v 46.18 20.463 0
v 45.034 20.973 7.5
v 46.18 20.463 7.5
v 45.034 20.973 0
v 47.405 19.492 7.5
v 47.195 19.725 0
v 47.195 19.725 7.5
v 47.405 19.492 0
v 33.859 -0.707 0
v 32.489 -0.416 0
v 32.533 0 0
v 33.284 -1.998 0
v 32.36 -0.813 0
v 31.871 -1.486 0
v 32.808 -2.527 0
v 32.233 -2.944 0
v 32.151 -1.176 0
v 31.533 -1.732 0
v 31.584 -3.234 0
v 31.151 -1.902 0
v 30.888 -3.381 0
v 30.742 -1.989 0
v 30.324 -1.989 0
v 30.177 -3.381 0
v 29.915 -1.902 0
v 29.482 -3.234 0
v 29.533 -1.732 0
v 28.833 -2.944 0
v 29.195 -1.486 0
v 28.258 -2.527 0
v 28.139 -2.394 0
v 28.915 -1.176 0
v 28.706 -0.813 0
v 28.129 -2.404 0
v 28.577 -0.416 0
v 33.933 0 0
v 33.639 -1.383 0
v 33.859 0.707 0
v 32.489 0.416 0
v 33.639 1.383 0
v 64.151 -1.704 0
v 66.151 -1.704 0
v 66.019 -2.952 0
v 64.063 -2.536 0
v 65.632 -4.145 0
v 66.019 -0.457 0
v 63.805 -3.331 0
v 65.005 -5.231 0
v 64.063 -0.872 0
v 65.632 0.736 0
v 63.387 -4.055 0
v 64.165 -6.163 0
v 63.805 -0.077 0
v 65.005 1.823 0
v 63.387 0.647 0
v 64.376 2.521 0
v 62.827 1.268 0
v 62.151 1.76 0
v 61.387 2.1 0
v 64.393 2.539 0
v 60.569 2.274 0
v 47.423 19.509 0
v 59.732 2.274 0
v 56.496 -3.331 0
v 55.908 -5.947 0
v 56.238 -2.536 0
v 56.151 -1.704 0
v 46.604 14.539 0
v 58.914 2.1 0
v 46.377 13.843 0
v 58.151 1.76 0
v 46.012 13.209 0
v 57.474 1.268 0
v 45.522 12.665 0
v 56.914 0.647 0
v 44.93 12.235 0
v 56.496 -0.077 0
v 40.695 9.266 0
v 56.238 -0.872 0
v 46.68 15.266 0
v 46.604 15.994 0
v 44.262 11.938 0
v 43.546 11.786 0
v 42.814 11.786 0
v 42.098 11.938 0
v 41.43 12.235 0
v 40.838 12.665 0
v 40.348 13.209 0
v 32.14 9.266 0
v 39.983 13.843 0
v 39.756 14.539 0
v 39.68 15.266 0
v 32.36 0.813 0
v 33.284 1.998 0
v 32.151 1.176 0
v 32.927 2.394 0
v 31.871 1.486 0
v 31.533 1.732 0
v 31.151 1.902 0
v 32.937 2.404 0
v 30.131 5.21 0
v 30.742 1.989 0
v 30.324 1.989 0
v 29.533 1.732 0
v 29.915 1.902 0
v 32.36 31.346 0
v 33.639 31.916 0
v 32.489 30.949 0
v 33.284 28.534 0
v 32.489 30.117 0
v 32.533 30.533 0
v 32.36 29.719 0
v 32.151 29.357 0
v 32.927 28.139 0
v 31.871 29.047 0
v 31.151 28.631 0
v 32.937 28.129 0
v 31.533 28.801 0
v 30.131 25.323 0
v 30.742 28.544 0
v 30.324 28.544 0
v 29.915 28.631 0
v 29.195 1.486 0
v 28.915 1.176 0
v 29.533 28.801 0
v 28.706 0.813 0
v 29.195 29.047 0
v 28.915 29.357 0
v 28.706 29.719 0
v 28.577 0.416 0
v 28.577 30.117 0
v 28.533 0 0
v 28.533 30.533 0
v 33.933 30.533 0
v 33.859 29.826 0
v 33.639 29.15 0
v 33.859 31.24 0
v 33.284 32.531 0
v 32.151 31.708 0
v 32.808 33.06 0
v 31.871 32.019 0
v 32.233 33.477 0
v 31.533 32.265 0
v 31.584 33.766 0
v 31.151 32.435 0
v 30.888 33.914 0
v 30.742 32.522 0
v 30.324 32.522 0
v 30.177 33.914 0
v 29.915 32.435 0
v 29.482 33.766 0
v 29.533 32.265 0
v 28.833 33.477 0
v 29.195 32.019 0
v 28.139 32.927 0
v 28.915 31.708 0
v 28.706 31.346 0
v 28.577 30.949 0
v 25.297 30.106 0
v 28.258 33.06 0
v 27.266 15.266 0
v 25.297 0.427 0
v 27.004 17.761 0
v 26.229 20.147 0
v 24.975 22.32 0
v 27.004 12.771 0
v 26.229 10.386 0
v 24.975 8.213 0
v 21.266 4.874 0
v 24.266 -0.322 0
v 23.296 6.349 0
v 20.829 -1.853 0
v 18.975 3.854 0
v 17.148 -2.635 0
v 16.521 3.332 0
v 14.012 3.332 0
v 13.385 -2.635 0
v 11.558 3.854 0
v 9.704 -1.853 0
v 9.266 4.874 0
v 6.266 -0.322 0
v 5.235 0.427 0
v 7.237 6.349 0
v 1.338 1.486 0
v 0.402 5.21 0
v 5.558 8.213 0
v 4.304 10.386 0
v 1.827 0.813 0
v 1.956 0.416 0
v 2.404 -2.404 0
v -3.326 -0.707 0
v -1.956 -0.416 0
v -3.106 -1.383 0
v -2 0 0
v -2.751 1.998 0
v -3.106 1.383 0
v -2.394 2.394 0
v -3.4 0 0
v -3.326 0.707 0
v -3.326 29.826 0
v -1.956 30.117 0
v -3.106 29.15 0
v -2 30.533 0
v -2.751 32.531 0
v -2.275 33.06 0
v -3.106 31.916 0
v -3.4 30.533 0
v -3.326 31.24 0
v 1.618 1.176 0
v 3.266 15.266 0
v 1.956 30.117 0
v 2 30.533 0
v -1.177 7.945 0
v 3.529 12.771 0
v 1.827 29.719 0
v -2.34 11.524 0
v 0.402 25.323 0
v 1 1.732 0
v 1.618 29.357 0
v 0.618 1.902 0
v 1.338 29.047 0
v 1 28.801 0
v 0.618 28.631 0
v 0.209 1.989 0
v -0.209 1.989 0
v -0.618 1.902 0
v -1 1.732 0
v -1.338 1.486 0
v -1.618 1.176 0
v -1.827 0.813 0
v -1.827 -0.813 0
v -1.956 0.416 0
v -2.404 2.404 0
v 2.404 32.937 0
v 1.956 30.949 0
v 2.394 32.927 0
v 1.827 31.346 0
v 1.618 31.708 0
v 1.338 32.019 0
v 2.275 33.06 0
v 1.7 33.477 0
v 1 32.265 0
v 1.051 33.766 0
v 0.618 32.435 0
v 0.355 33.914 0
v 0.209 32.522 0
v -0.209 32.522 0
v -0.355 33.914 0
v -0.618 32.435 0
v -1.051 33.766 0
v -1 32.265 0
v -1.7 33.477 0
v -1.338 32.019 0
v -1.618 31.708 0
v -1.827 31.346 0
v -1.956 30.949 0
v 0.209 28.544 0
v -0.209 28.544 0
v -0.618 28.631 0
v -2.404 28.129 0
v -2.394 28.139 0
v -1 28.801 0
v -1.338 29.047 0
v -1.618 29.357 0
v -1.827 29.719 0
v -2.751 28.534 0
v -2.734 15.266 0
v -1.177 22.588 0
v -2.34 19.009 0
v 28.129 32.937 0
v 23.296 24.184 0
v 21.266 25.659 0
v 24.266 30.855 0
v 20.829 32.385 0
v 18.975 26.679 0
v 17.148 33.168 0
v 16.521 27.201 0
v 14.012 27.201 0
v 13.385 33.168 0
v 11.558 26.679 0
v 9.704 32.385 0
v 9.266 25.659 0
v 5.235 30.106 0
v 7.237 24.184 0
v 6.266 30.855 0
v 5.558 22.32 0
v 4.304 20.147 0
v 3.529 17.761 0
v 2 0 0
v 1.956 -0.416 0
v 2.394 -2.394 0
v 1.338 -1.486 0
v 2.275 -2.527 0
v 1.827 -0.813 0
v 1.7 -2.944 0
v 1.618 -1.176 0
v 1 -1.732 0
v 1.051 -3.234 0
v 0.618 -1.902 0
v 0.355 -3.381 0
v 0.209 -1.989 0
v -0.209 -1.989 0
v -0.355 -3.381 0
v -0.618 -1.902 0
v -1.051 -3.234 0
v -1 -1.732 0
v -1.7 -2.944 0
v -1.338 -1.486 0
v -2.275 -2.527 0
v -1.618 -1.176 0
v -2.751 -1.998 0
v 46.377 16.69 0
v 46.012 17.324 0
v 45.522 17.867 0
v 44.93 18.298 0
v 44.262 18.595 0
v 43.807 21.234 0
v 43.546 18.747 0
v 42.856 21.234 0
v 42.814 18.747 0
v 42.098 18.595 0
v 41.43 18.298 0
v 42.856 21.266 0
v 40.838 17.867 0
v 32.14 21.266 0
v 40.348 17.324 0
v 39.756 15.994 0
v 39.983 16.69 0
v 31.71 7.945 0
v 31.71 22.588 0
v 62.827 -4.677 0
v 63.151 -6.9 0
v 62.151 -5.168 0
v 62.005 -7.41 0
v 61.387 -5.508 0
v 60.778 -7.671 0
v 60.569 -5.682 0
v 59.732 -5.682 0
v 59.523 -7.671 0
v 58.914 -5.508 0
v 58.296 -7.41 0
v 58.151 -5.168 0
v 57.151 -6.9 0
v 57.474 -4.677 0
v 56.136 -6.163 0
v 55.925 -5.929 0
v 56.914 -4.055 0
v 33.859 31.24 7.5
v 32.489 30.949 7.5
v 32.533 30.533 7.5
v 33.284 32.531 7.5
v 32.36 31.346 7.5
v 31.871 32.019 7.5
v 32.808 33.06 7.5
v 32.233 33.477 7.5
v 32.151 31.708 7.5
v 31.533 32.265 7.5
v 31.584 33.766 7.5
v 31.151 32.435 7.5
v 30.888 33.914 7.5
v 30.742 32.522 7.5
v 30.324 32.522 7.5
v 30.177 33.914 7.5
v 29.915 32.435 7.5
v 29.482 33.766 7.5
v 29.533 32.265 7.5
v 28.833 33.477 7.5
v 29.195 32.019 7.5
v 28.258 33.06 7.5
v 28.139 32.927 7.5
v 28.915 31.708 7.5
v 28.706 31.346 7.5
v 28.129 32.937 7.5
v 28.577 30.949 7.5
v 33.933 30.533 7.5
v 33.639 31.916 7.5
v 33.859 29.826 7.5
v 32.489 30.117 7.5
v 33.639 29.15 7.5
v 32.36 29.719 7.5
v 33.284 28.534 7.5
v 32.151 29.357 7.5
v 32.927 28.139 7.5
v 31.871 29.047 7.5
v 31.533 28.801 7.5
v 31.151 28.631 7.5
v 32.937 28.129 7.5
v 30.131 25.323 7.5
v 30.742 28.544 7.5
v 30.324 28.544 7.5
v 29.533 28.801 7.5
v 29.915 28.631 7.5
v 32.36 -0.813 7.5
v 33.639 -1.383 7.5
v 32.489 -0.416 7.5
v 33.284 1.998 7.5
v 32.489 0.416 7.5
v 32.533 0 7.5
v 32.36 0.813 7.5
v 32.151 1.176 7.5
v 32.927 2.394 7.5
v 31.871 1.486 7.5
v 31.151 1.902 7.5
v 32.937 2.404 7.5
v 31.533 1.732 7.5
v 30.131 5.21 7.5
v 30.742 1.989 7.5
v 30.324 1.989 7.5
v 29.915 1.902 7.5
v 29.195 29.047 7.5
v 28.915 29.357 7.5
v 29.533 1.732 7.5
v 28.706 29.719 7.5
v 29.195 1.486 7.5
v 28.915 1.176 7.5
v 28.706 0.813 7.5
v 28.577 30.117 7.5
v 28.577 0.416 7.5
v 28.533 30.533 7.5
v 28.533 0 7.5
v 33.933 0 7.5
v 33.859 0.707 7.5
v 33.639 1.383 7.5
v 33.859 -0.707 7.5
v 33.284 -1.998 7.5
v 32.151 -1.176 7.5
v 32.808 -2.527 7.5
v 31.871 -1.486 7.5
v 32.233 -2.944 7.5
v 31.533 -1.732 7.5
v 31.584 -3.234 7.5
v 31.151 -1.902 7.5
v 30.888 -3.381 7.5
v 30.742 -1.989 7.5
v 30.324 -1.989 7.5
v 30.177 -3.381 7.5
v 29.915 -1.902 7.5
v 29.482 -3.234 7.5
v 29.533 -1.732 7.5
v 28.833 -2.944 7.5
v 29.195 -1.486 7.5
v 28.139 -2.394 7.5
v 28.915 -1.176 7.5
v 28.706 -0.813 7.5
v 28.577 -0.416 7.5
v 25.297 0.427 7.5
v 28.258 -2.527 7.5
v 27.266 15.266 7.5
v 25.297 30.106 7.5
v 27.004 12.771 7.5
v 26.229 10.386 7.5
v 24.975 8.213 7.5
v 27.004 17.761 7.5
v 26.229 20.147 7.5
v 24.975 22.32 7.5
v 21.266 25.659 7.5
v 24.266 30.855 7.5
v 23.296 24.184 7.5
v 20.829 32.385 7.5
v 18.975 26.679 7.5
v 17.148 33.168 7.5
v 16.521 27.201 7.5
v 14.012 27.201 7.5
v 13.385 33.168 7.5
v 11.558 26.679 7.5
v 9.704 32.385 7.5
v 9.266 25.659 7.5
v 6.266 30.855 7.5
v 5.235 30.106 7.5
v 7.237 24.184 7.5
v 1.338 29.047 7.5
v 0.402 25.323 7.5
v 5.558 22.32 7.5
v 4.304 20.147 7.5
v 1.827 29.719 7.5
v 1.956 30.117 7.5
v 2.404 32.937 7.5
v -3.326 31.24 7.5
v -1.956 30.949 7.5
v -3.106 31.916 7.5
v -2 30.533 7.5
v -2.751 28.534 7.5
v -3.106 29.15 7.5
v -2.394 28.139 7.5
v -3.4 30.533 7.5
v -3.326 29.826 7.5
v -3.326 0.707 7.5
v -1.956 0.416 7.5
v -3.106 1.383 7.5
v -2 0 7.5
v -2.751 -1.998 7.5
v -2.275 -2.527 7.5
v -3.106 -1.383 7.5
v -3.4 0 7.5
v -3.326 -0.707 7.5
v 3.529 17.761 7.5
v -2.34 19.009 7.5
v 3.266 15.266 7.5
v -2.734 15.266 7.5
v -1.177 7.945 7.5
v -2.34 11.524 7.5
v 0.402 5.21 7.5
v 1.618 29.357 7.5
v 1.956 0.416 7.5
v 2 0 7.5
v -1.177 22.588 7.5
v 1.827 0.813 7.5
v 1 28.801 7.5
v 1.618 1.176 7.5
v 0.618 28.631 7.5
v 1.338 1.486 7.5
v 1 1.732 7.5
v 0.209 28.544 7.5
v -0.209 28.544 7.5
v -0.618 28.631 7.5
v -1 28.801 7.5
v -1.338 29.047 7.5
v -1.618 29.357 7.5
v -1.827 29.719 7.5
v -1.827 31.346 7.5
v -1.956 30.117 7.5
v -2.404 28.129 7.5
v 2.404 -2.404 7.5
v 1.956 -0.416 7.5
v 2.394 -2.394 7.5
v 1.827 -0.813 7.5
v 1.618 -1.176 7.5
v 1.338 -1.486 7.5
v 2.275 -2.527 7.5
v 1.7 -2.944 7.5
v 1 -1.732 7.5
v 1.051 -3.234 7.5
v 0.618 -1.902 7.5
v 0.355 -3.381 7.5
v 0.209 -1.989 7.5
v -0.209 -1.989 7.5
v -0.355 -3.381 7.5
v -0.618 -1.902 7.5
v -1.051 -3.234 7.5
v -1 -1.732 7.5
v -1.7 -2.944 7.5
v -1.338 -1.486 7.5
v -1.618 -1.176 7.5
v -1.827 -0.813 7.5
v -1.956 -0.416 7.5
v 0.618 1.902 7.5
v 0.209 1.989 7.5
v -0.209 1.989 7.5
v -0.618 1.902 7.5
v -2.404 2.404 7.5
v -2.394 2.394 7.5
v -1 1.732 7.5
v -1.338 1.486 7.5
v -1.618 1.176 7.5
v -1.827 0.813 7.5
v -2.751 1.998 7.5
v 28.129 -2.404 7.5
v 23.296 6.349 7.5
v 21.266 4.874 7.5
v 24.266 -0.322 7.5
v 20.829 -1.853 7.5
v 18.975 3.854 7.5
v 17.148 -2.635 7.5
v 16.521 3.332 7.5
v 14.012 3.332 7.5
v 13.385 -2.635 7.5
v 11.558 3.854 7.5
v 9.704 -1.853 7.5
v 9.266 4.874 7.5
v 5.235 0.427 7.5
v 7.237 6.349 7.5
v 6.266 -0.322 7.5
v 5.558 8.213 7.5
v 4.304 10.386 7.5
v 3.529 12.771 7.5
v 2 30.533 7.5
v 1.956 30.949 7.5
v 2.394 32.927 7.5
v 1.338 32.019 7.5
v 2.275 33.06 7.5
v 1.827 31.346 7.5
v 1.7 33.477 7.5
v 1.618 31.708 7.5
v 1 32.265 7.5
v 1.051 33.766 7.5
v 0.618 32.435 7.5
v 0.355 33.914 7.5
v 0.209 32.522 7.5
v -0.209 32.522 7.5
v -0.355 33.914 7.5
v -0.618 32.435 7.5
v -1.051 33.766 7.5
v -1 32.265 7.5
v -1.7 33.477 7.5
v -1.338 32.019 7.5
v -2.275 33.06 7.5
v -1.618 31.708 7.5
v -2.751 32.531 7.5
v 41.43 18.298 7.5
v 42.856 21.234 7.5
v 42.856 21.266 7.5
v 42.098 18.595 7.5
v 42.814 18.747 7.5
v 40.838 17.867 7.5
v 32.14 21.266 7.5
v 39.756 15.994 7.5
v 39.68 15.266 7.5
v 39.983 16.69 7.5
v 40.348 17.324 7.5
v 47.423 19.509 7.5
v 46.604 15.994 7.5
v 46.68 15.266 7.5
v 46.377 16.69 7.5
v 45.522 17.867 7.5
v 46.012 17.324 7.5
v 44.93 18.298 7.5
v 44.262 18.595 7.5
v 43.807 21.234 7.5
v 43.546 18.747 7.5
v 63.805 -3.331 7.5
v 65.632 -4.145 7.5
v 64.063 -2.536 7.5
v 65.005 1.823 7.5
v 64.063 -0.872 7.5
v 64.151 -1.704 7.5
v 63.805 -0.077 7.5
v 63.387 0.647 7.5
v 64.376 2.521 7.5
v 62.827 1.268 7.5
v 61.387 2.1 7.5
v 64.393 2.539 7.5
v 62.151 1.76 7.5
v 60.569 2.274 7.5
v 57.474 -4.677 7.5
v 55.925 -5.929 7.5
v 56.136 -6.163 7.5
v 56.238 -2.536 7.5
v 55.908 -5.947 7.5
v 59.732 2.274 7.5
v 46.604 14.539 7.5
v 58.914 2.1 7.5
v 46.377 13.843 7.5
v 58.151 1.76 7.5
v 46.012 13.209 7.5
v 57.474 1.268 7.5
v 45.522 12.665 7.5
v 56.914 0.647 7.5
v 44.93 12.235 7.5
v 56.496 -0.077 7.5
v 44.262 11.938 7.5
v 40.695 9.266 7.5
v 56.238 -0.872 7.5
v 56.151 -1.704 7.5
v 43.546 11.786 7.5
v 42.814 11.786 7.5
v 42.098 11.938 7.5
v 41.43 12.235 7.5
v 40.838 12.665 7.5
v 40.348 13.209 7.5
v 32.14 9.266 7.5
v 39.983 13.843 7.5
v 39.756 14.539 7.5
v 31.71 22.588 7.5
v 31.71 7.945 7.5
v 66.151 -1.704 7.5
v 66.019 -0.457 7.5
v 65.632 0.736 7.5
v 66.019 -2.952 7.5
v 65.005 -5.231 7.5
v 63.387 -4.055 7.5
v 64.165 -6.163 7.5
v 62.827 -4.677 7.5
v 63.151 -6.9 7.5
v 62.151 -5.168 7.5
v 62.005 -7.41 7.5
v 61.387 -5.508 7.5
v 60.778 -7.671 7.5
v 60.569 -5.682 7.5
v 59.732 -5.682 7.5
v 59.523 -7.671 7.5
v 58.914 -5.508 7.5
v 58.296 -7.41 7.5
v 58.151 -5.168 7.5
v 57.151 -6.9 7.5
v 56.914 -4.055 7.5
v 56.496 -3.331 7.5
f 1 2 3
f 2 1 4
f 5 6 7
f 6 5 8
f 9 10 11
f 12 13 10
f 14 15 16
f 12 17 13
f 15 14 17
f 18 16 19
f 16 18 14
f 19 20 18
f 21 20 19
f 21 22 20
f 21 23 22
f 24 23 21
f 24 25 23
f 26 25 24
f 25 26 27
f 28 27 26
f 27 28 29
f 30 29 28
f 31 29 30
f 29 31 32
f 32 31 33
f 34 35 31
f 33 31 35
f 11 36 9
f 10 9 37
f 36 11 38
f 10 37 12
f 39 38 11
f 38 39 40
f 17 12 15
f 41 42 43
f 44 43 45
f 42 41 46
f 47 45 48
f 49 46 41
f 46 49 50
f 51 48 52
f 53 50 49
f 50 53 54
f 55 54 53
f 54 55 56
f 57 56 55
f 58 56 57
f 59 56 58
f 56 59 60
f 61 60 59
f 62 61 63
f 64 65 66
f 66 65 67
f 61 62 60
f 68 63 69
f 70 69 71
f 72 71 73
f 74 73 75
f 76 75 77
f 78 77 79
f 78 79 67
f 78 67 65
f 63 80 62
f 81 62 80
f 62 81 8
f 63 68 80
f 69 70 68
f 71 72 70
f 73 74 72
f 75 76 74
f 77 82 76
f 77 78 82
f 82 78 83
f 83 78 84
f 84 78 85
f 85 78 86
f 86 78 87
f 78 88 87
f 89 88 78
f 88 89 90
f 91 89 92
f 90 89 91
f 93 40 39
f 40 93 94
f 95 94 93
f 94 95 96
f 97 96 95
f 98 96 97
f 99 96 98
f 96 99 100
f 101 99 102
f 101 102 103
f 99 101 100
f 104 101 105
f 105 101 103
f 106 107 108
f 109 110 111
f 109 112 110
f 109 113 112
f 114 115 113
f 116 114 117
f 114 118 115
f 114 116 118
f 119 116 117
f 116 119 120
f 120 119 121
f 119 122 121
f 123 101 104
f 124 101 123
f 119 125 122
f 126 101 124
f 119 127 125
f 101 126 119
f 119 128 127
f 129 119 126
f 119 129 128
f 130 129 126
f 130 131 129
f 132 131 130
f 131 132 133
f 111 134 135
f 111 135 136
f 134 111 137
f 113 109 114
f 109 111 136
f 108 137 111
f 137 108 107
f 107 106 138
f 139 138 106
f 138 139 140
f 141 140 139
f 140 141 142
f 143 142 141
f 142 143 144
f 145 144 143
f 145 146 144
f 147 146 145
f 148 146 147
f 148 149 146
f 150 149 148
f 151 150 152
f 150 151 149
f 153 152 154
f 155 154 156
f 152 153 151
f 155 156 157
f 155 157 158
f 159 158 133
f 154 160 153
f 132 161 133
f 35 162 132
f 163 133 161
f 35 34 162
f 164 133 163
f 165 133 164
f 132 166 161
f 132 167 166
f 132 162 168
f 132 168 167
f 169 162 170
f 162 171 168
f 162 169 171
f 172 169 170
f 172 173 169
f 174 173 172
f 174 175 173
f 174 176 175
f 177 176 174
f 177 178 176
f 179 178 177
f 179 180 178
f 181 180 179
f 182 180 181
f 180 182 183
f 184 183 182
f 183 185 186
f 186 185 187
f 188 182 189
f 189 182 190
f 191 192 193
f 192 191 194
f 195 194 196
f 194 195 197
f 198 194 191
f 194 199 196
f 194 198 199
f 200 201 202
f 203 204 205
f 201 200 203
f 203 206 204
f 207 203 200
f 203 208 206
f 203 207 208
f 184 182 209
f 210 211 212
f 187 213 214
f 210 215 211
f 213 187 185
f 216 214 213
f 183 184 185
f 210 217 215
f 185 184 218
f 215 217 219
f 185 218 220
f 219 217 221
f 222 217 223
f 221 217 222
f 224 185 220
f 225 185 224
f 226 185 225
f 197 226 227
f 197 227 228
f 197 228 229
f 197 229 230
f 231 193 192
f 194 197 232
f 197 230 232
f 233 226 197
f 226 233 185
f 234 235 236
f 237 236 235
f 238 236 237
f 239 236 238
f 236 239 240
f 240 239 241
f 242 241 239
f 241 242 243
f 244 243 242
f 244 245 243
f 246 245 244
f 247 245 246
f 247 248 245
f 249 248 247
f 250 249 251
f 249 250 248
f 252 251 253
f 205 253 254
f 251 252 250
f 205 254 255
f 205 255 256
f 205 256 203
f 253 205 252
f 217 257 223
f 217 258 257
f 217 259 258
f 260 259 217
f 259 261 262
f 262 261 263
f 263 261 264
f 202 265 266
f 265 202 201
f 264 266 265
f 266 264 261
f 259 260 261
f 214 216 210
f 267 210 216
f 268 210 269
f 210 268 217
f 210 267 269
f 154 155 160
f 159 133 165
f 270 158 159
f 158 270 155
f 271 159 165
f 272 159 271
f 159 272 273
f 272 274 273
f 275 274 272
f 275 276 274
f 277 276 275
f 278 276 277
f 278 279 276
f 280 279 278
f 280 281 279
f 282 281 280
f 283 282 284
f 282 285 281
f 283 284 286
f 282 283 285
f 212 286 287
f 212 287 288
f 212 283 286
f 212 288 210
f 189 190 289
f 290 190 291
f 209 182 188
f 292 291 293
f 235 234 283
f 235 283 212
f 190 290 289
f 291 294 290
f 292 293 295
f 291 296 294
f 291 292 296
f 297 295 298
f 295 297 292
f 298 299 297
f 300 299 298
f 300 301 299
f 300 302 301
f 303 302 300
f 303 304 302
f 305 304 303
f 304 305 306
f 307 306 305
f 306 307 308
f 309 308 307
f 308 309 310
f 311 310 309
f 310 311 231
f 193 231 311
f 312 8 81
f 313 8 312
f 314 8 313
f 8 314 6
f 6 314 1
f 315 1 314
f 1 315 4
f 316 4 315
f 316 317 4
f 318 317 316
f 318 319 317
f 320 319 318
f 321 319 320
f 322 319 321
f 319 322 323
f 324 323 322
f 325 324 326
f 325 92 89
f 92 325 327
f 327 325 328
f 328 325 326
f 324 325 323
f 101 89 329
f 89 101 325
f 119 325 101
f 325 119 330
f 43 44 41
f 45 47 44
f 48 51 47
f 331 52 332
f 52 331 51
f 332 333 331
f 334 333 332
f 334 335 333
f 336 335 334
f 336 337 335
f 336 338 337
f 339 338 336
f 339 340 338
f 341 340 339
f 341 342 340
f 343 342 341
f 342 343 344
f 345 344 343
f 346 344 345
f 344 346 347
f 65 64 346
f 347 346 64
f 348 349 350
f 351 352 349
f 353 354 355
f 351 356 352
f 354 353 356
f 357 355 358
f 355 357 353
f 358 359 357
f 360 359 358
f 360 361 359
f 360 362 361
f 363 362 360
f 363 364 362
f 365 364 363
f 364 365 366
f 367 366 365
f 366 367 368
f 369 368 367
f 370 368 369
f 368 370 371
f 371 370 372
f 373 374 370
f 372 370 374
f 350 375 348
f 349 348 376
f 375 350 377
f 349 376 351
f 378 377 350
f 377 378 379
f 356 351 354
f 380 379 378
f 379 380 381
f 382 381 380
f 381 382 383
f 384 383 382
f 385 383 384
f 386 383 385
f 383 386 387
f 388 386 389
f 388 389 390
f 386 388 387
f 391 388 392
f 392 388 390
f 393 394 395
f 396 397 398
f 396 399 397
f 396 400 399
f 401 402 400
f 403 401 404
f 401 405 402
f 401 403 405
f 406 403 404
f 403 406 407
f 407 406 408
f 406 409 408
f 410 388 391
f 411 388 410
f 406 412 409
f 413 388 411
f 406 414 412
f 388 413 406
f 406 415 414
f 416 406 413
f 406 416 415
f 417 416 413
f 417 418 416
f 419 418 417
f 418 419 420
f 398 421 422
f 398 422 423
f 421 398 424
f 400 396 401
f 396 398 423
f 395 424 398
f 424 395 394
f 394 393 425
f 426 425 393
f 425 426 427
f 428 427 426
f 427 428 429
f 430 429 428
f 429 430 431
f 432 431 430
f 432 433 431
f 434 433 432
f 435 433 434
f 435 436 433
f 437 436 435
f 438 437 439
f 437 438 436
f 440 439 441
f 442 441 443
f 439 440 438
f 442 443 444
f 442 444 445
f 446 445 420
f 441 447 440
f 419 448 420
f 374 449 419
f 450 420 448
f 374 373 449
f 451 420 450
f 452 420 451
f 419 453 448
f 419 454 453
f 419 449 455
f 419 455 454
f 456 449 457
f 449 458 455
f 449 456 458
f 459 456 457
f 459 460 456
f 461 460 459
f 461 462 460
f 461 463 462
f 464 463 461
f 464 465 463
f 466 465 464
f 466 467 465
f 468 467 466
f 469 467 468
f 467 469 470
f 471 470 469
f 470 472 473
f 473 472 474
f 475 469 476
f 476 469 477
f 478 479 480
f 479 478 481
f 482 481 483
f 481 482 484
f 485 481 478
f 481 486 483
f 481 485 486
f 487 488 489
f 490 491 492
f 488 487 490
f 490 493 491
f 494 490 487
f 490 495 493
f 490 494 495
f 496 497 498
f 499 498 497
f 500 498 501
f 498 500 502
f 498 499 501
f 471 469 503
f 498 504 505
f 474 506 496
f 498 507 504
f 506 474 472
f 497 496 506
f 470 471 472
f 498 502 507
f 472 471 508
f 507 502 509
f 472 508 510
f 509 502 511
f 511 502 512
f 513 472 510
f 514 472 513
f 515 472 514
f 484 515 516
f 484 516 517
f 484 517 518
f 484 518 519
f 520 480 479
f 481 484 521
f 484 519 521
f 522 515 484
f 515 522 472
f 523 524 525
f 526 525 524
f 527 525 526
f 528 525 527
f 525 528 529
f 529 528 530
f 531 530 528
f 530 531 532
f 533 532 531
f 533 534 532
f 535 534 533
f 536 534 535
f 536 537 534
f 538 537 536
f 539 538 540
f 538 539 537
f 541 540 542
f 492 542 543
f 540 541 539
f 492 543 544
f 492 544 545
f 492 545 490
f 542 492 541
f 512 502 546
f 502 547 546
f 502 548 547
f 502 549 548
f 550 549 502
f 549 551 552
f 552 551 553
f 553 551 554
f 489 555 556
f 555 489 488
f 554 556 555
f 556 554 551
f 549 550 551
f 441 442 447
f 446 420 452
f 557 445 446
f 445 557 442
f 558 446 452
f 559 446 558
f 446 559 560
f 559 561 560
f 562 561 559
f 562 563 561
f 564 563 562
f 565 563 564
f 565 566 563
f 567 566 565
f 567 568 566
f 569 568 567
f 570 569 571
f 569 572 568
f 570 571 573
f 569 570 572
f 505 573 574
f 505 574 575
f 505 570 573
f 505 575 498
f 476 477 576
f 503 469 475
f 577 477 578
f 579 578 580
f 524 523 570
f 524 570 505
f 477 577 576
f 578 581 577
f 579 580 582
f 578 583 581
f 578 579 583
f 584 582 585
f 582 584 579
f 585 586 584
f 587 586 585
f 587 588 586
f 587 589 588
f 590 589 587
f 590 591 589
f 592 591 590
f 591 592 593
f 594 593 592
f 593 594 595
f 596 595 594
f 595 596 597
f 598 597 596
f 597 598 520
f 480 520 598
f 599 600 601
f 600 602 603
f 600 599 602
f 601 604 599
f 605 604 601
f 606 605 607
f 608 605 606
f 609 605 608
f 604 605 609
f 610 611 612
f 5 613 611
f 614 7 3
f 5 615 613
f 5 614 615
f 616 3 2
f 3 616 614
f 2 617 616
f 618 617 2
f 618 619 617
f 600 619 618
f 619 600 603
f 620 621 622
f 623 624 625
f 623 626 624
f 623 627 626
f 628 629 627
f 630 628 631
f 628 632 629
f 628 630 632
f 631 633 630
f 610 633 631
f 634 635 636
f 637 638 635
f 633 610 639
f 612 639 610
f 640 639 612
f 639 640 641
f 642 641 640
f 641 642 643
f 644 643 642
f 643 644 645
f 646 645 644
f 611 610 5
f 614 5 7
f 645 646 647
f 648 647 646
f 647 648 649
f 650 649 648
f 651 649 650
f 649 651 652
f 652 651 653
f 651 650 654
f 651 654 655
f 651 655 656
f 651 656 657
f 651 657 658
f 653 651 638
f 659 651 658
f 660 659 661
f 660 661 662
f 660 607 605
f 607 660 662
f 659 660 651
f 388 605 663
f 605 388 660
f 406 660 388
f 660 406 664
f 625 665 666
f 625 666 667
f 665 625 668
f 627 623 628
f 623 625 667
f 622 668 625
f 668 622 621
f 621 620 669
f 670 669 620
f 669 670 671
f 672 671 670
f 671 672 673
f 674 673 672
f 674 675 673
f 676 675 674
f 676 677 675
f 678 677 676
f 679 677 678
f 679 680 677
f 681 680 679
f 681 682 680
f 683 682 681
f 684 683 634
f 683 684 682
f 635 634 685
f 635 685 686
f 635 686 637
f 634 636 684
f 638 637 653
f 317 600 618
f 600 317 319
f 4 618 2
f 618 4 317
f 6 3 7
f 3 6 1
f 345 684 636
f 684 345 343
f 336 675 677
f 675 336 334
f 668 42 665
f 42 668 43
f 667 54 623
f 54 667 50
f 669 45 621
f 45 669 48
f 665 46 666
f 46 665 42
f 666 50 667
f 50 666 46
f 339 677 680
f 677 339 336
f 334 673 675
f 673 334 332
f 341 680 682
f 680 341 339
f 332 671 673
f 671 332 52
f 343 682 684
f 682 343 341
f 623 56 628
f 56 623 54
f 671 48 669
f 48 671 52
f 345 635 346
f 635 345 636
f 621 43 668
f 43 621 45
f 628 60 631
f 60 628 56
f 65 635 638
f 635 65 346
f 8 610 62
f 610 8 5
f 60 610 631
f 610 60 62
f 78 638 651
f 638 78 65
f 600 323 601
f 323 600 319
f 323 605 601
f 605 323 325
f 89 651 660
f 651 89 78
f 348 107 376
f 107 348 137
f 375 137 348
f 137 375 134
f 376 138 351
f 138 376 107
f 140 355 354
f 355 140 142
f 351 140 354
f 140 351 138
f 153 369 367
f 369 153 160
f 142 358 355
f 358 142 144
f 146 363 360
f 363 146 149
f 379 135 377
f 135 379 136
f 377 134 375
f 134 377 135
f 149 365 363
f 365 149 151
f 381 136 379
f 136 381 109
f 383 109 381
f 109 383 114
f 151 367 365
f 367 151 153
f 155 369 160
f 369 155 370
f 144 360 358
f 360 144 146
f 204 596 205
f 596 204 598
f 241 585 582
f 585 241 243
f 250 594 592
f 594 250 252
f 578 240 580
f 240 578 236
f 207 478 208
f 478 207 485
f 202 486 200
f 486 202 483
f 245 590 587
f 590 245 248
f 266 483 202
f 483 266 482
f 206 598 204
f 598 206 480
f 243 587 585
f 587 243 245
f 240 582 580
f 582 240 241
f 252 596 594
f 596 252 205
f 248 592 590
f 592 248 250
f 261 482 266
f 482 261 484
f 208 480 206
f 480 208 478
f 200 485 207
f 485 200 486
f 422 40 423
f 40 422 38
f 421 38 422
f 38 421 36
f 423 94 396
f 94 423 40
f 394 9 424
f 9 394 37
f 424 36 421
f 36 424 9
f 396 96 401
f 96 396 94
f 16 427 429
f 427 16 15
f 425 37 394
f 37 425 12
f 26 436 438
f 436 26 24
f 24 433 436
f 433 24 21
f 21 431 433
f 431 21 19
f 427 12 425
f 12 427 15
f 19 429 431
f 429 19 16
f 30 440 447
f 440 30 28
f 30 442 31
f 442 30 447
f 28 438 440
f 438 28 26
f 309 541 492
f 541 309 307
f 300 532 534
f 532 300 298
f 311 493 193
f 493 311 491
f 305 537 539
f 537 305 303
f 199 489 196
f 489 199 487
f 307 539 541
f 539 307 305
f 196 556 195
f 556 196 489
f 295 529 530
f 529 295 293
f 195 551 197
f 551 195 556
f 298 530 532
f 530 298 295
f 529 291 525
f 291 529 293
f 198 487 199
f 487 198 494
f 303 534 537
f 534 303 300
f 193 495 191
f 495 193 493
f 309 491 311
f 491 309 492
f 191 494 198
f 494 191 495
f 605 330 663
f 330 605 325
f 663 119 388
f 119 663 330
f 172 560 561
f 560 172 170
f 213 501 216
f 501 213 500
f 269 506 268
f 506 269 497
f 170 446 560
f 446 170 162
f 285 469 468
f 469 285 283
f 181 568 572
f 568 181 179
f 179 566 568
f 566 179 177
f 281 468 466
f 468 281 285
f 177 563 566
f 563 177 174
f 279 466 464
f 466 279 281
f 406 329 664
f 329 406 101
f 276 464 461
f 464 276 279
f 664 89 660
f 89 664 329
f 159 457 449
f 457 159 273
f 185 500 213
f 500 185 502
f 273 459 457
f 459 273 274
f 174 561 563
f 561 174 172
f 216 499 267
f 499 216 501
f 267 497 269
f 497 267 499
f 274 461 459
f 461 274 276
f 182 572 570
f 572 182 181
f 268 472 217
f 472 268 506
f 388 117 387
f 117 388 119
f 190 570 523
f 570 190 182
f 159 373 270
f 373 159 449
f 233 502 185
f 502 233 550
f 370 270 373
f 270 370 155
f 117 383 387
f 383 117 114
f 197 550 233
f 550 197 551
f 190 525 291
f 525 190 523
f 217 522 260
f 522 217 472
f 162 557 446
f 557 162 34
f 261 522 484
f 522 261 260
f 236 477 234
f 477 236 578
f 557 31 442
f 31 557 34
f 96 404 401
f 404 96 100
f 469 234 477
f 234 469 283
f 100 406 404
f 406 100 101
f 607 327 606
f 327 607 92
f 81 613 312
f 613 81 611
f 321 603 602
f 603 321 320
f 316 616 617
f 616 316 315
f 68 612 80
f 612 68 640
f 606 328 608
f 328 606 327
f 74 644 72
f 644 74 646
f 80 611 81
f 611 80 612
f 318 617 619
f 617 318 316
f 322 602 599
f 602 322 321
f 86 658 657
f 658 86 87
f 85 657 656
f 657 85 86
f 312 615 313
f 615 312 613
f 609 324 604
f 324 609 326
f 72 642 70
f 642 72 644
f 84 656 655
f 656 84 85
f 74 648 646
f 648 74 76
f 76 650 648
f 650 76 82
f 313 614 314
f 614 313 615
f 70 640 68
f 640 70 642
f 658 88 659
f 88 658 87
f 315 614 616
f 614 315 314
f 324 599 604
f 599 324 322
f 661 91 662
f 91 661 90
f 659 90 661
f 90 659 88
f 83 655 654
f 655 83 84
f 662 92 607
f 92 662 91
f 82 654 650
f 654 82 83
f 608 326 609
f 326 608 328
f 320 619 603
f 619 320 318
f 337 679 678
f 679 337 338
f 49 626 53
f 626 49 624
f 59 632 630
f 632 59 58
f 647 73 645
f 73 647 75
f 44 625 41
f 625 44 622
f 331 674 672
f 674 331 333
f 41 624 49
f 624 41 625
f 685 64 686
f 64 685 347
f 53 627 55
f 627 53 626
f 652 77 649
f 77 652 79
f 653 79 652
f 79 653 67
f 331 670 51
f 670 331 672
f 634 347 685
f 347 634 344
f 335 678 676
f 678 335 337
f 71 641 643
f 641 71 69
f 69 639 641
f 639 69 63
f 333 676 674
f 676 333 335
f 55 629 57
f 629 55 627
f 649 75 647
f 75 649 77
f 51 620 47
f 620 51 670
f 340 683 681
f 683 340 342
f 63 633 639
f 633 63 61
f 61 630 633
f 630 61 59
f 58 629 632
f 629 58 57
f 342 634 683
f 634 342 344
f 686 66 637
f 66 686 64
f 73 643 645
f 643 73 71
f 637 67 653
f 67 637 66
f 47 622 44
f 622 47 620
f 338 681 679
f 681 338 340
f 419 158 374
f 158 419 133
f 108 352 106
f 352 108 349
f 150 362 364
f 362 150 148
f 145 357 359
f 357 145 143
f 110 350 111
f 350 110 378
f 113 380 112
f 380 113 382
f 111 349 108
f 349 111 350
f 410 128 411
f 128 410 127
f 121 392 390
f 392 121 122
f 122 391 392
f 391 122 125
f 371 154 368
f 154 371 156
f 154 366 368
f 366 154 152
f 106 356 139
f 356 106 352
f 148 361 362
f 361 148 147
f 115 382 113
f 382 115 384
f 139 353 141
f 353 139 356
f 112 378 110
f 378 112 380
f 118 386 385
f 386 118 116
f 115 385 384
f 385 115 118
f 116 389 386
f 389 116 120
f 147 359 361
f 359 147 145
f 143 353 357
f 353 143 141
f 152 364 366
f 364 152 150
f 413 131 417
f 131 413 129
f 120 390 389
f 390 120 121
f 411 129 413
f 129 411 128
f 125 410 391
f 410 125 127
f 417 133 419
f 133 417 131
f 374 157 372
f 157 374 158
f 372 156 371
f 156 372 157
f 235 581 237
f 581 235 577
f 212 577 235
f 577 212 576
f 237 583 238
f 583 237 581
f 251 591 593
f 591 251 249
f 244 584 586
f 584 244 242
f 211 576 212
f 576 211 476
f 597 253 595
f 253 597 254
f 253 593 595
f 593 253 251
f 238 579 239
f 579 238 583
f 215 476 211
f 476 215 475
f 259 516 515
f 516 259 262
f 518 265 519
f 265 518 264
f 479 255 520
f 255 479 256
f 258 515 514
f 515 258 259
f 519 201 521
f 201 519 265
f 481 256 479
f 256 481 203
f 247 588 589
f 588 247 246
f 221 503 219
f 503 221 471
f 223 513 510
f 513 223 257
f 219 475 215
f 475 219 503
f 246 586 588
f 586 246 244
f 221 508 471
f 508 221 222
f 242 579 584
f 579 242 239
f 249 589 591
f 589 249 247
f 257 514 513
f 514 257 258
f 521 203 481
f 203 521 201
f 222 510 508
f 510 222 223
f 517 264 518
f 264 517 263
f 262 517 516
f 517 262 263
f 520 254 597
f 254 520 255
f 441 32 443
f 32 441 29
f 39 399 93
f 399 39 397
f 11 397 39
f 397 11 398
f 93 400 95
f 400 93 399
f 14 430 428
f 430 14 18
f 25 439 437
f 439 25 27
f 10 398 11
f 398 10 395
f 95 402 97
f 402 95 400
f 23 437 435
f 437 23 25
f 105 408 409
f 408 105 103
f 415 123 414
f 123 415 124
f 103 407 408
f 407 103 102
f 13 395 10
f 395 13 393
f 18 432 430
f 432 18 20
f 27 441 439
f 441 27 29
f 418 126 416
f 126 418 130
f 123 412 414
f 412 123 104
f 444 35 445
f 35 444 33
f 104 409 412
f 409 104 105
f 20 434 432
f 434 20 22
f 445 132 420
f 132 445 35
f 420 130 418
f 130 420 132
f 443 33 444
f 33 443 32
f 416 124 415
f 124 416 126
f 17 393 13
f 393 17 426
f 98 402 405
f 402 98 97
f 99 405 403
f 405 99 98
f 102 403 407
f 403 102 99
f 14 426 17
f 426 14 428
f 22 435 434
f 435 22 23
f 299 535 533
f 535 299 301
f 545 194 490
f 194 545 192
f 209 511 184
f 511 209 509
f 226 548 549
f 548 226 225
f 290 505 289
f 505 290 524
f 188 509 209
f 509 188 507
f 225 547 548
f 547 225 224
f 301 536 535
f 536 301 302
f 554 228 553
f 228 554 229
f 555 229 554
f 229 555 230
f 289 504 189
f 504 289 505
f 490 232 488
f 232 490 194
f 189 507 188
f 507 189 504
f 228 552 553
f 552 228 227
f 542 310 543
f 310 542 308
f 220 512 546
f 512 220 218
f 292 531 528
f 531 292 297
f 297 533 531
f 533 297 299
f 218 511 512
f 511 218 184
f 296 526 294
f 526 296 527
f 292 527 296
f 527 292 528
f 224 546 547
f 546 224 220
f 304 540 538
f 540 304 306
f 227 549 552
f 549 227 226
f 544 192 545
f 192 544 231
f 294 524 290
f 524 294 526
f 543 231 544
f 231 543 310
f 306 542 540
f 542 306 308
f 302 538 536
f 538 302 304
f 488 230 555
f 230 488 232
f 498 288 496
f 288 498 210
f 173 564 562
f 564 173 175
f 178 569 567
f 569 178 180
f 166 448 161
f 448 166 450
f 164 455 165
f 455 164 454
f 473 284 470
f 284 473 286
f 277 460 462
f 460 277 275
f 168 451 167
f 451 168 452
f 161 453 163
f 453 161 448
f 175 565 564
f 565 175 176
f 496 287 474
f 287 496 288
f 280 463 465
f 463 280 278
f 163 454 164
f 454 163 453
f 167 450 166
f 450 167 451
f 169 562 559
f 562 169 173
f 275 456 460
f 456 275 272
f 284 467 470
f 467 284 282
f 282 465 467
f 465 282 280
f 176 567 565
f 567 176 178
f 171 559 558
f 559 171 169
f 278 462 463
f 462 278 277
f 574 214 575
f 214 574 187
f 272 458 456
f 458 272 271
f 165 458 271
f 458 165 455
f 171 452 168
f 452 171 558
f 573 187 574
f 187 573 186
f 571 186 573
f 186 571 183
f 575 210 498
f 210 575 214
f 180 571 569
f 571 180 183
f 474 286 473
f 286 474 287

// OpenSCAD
// file: config.scad
//This REALLY REALLY needs to get organized. I will start sorting through it ASAP 

//Vars for the fram vertex. This is still kind of confusing. File is broke sometimes. I would watch this in preview before trusting these values.
framerodsize = 8.5;
framerodtap =7; // we use this one in the y motor for the top rod that gets tapped as well
vertexwall = 3;
vertexthick = framerodsize*2 + vertexwall*2; // I would say leave this alone. 
triangle= 60;
mirror=false;

// vars for the y motor mount
vertexhole = 8; //the diameter of the vertex hole in whosawhatasis vertex. Really important these values match.
partthick =9;
wallmulti = 2; //the wall thickness multiplier
motorwallmulti = 2.3; //multiplier for the motor holes because you might want them thicker
centerwallmulti = 1.5; //multiplier for the center hole because you might want them thinner
nemasize = 1.7;
motorscrew = 4; //diameter of the motor attachment screw
motorcenter = 24; //center hole size for the motor

//Top piece vars
nemasize= 1.7;
motorwallmulti= 1.9;
motorscrew = 4;
motorcenter= 23;
centerwallmulti = 1.7;
motorbody = 43;

partthick = 8;
toprodbefore =7;
toproddia = 8.5;
toprodwall = 4;
toprodspacing = 72;
siderodtap = 7;
sideroddia = 8;
siderodwall = 4;
angle = 60;

zsmoothdia =8;

xrodspacing = 55; //rod spacing center to center
xroddia = 8; //rod diamter
nemasize = 1.7;
znutdia = 14.8;
znuth = 7; //znut height
zroddia = 8;
nutwall = 3; //wall thickness
zbeforetapdia = 7.5; 
bushingod = 16;
bushingtower =xroddia+nutwall*sin(45)+xrodspacing ;
towergap= 10;
wallmulti = 1.5;
motorwallmulti = 1.7;
motorscrew =4;
partthick = 7.5; //thickness of the motor mount
centerwallmulti = 1.5; // center motor hole multi
motorcenter = 24;
supportwidth = 17;
$fn = 30;

//xcarriage 
carriagewidth = 60;
bushingwall = 3;
backwall = 5;
tools = 2;
tool1dia = 16;
tool2dia = 16;
adapterholedia = 4;
platformthick = 10;
platformextension = 40; 
pulleydia = 12;
beltthick = 2;
clampthick = 4;
clampholedia = 4;

//pen holder 
penwall = 3 ;
holdingscrewdia = 3;
shaftheight = 30;
// main file
//vertexhole = 8; //the diameter of the vertex hole in whosawhatasis vertex. Really important these values match.
//partthick =9;
//wallmulti = 1.8; //the wall thickness multiplier
//motorwallmulti = 2; //multiplier for the motor holes because you might want them thicker
//centerwallmulti = 1.5; //multiplier for the center hole because you might want them thinner
//nemasize = 1.7;
//motorscrew = 4; //diameter of the motor attachment screw
//motorcenter = 24; //center hole size for the motor
include <config.scad>;
$fn = 30;

//construction
	difference(){
		union(){
		//vertex interfaces
		translate([nemasize*2.54*10,nemasize*2.54*5*sin(45),0])cylinder(r=vertexhole/2*wallmulti, h=partthick);
		translate([vertexhole*3*sin(45)+(nemasize*2.54*10),nemasize*2.54*5*sin(45)-vertexhole*3*sin(45),0])cylinder(r=vertexhole/2*wallmulti, h=partthick);
		//connetors
		translate([nemasize*2.54*10-(sin(45)*vertexhole/2*wallmulti),nemasize*2.54*5*sin(45)-vertexhole/2*wallmulti*sin(45),0])rotate([0,0,-45])cube([vertexhole*3,vertexhole*wallmulti,partthick]);
		translate([nemasize*2.54*5*sin(45),nemasize*2.54*5*sin(45)-vertexhole/2*wallmulti,0])cube([nemasize*2.54*5+vertexhole/2*wallmulti,vertexhole*wallmulti,partthick]);
		//motor construction
		translate([nemasize*2.54*sin(45)*10,nemasize*2.54*sin(45)*10,0])cylinder(r=motorscrew/2*motorwallmulti, h=partthick);
		translate([0,nemasize*2.54*sin(45)*10,0])cylinder(r=motorscrew/2*motorwallmulti, h=partthick);
		translate([nemasize*2.54*sin(45)*10,0,0])cylinder(r=motorscrew/2*motorwallmulti, h=partthick);
		translate([0,0,0])cylinder(r=motorscrew/2*motorwallmulti, h=partthick);
		translate([nemasize*2.54*sin(45)*5,nemasize*2.54*sin(45)*5,0])cylinder(r=motorcenter/2*centerwallmulti, h=partthick); //motorcenter
		translate([-motorscrew/2*motorwallmulti*sin(45),motorscrew/2*motorwallmulti*sin(45),0])rotate([0,0,-45])cube([motorscrew*motorwallmulti,nemasize*2.54*10,partthick]);
		translate([nemasize*2.54*sin(45)*10-(motorscrew/2*motorwallmulti*sin(45)),-motorscrew/2*motorwallmulti*sin(45),0])rotate([0,0,45])cube([motorscrew*motorwallmulti,nemasize*2.54*10,partthick]);
		}
		//vertex interfaces
		translate([nemasize*2.54*10,nemasize*2.54*5*sin(45),0])cylinder(r=framerodtap/2, h=partthick);
		translate([vertexhole*3*sin(45)+(nemasize*2.54*10),nemasize*2.54*5*sin(45)-vertexhole*3*sin(45),0])cylinder(r=vertexhole/2, h=partthick);
		//motor screws
		translate([nemasize*2.54*sin(45)*10,nemasize*2.54*sin(45)*10,0])cylinder(r=motorscrew/2, h=partthick);
		translate([0,nemasize*2.54*sin(45)*10,0])cylinder(r=motorscrew/2, h=partthick);
		translate([nemasize*2.54*sin(45)*10,0,0])cylinder(r=motorscrew/2, h=partthick);
		translate([0,0,0])cylinder(r=motorscrew/2, h=partthick);
		translate([nemasize*2.54*sin(45)*5,nemasize*2.54*sin(45)*5,0])cylinder(r=motorcenter/2, h=partthick); //motorcenter
	}
